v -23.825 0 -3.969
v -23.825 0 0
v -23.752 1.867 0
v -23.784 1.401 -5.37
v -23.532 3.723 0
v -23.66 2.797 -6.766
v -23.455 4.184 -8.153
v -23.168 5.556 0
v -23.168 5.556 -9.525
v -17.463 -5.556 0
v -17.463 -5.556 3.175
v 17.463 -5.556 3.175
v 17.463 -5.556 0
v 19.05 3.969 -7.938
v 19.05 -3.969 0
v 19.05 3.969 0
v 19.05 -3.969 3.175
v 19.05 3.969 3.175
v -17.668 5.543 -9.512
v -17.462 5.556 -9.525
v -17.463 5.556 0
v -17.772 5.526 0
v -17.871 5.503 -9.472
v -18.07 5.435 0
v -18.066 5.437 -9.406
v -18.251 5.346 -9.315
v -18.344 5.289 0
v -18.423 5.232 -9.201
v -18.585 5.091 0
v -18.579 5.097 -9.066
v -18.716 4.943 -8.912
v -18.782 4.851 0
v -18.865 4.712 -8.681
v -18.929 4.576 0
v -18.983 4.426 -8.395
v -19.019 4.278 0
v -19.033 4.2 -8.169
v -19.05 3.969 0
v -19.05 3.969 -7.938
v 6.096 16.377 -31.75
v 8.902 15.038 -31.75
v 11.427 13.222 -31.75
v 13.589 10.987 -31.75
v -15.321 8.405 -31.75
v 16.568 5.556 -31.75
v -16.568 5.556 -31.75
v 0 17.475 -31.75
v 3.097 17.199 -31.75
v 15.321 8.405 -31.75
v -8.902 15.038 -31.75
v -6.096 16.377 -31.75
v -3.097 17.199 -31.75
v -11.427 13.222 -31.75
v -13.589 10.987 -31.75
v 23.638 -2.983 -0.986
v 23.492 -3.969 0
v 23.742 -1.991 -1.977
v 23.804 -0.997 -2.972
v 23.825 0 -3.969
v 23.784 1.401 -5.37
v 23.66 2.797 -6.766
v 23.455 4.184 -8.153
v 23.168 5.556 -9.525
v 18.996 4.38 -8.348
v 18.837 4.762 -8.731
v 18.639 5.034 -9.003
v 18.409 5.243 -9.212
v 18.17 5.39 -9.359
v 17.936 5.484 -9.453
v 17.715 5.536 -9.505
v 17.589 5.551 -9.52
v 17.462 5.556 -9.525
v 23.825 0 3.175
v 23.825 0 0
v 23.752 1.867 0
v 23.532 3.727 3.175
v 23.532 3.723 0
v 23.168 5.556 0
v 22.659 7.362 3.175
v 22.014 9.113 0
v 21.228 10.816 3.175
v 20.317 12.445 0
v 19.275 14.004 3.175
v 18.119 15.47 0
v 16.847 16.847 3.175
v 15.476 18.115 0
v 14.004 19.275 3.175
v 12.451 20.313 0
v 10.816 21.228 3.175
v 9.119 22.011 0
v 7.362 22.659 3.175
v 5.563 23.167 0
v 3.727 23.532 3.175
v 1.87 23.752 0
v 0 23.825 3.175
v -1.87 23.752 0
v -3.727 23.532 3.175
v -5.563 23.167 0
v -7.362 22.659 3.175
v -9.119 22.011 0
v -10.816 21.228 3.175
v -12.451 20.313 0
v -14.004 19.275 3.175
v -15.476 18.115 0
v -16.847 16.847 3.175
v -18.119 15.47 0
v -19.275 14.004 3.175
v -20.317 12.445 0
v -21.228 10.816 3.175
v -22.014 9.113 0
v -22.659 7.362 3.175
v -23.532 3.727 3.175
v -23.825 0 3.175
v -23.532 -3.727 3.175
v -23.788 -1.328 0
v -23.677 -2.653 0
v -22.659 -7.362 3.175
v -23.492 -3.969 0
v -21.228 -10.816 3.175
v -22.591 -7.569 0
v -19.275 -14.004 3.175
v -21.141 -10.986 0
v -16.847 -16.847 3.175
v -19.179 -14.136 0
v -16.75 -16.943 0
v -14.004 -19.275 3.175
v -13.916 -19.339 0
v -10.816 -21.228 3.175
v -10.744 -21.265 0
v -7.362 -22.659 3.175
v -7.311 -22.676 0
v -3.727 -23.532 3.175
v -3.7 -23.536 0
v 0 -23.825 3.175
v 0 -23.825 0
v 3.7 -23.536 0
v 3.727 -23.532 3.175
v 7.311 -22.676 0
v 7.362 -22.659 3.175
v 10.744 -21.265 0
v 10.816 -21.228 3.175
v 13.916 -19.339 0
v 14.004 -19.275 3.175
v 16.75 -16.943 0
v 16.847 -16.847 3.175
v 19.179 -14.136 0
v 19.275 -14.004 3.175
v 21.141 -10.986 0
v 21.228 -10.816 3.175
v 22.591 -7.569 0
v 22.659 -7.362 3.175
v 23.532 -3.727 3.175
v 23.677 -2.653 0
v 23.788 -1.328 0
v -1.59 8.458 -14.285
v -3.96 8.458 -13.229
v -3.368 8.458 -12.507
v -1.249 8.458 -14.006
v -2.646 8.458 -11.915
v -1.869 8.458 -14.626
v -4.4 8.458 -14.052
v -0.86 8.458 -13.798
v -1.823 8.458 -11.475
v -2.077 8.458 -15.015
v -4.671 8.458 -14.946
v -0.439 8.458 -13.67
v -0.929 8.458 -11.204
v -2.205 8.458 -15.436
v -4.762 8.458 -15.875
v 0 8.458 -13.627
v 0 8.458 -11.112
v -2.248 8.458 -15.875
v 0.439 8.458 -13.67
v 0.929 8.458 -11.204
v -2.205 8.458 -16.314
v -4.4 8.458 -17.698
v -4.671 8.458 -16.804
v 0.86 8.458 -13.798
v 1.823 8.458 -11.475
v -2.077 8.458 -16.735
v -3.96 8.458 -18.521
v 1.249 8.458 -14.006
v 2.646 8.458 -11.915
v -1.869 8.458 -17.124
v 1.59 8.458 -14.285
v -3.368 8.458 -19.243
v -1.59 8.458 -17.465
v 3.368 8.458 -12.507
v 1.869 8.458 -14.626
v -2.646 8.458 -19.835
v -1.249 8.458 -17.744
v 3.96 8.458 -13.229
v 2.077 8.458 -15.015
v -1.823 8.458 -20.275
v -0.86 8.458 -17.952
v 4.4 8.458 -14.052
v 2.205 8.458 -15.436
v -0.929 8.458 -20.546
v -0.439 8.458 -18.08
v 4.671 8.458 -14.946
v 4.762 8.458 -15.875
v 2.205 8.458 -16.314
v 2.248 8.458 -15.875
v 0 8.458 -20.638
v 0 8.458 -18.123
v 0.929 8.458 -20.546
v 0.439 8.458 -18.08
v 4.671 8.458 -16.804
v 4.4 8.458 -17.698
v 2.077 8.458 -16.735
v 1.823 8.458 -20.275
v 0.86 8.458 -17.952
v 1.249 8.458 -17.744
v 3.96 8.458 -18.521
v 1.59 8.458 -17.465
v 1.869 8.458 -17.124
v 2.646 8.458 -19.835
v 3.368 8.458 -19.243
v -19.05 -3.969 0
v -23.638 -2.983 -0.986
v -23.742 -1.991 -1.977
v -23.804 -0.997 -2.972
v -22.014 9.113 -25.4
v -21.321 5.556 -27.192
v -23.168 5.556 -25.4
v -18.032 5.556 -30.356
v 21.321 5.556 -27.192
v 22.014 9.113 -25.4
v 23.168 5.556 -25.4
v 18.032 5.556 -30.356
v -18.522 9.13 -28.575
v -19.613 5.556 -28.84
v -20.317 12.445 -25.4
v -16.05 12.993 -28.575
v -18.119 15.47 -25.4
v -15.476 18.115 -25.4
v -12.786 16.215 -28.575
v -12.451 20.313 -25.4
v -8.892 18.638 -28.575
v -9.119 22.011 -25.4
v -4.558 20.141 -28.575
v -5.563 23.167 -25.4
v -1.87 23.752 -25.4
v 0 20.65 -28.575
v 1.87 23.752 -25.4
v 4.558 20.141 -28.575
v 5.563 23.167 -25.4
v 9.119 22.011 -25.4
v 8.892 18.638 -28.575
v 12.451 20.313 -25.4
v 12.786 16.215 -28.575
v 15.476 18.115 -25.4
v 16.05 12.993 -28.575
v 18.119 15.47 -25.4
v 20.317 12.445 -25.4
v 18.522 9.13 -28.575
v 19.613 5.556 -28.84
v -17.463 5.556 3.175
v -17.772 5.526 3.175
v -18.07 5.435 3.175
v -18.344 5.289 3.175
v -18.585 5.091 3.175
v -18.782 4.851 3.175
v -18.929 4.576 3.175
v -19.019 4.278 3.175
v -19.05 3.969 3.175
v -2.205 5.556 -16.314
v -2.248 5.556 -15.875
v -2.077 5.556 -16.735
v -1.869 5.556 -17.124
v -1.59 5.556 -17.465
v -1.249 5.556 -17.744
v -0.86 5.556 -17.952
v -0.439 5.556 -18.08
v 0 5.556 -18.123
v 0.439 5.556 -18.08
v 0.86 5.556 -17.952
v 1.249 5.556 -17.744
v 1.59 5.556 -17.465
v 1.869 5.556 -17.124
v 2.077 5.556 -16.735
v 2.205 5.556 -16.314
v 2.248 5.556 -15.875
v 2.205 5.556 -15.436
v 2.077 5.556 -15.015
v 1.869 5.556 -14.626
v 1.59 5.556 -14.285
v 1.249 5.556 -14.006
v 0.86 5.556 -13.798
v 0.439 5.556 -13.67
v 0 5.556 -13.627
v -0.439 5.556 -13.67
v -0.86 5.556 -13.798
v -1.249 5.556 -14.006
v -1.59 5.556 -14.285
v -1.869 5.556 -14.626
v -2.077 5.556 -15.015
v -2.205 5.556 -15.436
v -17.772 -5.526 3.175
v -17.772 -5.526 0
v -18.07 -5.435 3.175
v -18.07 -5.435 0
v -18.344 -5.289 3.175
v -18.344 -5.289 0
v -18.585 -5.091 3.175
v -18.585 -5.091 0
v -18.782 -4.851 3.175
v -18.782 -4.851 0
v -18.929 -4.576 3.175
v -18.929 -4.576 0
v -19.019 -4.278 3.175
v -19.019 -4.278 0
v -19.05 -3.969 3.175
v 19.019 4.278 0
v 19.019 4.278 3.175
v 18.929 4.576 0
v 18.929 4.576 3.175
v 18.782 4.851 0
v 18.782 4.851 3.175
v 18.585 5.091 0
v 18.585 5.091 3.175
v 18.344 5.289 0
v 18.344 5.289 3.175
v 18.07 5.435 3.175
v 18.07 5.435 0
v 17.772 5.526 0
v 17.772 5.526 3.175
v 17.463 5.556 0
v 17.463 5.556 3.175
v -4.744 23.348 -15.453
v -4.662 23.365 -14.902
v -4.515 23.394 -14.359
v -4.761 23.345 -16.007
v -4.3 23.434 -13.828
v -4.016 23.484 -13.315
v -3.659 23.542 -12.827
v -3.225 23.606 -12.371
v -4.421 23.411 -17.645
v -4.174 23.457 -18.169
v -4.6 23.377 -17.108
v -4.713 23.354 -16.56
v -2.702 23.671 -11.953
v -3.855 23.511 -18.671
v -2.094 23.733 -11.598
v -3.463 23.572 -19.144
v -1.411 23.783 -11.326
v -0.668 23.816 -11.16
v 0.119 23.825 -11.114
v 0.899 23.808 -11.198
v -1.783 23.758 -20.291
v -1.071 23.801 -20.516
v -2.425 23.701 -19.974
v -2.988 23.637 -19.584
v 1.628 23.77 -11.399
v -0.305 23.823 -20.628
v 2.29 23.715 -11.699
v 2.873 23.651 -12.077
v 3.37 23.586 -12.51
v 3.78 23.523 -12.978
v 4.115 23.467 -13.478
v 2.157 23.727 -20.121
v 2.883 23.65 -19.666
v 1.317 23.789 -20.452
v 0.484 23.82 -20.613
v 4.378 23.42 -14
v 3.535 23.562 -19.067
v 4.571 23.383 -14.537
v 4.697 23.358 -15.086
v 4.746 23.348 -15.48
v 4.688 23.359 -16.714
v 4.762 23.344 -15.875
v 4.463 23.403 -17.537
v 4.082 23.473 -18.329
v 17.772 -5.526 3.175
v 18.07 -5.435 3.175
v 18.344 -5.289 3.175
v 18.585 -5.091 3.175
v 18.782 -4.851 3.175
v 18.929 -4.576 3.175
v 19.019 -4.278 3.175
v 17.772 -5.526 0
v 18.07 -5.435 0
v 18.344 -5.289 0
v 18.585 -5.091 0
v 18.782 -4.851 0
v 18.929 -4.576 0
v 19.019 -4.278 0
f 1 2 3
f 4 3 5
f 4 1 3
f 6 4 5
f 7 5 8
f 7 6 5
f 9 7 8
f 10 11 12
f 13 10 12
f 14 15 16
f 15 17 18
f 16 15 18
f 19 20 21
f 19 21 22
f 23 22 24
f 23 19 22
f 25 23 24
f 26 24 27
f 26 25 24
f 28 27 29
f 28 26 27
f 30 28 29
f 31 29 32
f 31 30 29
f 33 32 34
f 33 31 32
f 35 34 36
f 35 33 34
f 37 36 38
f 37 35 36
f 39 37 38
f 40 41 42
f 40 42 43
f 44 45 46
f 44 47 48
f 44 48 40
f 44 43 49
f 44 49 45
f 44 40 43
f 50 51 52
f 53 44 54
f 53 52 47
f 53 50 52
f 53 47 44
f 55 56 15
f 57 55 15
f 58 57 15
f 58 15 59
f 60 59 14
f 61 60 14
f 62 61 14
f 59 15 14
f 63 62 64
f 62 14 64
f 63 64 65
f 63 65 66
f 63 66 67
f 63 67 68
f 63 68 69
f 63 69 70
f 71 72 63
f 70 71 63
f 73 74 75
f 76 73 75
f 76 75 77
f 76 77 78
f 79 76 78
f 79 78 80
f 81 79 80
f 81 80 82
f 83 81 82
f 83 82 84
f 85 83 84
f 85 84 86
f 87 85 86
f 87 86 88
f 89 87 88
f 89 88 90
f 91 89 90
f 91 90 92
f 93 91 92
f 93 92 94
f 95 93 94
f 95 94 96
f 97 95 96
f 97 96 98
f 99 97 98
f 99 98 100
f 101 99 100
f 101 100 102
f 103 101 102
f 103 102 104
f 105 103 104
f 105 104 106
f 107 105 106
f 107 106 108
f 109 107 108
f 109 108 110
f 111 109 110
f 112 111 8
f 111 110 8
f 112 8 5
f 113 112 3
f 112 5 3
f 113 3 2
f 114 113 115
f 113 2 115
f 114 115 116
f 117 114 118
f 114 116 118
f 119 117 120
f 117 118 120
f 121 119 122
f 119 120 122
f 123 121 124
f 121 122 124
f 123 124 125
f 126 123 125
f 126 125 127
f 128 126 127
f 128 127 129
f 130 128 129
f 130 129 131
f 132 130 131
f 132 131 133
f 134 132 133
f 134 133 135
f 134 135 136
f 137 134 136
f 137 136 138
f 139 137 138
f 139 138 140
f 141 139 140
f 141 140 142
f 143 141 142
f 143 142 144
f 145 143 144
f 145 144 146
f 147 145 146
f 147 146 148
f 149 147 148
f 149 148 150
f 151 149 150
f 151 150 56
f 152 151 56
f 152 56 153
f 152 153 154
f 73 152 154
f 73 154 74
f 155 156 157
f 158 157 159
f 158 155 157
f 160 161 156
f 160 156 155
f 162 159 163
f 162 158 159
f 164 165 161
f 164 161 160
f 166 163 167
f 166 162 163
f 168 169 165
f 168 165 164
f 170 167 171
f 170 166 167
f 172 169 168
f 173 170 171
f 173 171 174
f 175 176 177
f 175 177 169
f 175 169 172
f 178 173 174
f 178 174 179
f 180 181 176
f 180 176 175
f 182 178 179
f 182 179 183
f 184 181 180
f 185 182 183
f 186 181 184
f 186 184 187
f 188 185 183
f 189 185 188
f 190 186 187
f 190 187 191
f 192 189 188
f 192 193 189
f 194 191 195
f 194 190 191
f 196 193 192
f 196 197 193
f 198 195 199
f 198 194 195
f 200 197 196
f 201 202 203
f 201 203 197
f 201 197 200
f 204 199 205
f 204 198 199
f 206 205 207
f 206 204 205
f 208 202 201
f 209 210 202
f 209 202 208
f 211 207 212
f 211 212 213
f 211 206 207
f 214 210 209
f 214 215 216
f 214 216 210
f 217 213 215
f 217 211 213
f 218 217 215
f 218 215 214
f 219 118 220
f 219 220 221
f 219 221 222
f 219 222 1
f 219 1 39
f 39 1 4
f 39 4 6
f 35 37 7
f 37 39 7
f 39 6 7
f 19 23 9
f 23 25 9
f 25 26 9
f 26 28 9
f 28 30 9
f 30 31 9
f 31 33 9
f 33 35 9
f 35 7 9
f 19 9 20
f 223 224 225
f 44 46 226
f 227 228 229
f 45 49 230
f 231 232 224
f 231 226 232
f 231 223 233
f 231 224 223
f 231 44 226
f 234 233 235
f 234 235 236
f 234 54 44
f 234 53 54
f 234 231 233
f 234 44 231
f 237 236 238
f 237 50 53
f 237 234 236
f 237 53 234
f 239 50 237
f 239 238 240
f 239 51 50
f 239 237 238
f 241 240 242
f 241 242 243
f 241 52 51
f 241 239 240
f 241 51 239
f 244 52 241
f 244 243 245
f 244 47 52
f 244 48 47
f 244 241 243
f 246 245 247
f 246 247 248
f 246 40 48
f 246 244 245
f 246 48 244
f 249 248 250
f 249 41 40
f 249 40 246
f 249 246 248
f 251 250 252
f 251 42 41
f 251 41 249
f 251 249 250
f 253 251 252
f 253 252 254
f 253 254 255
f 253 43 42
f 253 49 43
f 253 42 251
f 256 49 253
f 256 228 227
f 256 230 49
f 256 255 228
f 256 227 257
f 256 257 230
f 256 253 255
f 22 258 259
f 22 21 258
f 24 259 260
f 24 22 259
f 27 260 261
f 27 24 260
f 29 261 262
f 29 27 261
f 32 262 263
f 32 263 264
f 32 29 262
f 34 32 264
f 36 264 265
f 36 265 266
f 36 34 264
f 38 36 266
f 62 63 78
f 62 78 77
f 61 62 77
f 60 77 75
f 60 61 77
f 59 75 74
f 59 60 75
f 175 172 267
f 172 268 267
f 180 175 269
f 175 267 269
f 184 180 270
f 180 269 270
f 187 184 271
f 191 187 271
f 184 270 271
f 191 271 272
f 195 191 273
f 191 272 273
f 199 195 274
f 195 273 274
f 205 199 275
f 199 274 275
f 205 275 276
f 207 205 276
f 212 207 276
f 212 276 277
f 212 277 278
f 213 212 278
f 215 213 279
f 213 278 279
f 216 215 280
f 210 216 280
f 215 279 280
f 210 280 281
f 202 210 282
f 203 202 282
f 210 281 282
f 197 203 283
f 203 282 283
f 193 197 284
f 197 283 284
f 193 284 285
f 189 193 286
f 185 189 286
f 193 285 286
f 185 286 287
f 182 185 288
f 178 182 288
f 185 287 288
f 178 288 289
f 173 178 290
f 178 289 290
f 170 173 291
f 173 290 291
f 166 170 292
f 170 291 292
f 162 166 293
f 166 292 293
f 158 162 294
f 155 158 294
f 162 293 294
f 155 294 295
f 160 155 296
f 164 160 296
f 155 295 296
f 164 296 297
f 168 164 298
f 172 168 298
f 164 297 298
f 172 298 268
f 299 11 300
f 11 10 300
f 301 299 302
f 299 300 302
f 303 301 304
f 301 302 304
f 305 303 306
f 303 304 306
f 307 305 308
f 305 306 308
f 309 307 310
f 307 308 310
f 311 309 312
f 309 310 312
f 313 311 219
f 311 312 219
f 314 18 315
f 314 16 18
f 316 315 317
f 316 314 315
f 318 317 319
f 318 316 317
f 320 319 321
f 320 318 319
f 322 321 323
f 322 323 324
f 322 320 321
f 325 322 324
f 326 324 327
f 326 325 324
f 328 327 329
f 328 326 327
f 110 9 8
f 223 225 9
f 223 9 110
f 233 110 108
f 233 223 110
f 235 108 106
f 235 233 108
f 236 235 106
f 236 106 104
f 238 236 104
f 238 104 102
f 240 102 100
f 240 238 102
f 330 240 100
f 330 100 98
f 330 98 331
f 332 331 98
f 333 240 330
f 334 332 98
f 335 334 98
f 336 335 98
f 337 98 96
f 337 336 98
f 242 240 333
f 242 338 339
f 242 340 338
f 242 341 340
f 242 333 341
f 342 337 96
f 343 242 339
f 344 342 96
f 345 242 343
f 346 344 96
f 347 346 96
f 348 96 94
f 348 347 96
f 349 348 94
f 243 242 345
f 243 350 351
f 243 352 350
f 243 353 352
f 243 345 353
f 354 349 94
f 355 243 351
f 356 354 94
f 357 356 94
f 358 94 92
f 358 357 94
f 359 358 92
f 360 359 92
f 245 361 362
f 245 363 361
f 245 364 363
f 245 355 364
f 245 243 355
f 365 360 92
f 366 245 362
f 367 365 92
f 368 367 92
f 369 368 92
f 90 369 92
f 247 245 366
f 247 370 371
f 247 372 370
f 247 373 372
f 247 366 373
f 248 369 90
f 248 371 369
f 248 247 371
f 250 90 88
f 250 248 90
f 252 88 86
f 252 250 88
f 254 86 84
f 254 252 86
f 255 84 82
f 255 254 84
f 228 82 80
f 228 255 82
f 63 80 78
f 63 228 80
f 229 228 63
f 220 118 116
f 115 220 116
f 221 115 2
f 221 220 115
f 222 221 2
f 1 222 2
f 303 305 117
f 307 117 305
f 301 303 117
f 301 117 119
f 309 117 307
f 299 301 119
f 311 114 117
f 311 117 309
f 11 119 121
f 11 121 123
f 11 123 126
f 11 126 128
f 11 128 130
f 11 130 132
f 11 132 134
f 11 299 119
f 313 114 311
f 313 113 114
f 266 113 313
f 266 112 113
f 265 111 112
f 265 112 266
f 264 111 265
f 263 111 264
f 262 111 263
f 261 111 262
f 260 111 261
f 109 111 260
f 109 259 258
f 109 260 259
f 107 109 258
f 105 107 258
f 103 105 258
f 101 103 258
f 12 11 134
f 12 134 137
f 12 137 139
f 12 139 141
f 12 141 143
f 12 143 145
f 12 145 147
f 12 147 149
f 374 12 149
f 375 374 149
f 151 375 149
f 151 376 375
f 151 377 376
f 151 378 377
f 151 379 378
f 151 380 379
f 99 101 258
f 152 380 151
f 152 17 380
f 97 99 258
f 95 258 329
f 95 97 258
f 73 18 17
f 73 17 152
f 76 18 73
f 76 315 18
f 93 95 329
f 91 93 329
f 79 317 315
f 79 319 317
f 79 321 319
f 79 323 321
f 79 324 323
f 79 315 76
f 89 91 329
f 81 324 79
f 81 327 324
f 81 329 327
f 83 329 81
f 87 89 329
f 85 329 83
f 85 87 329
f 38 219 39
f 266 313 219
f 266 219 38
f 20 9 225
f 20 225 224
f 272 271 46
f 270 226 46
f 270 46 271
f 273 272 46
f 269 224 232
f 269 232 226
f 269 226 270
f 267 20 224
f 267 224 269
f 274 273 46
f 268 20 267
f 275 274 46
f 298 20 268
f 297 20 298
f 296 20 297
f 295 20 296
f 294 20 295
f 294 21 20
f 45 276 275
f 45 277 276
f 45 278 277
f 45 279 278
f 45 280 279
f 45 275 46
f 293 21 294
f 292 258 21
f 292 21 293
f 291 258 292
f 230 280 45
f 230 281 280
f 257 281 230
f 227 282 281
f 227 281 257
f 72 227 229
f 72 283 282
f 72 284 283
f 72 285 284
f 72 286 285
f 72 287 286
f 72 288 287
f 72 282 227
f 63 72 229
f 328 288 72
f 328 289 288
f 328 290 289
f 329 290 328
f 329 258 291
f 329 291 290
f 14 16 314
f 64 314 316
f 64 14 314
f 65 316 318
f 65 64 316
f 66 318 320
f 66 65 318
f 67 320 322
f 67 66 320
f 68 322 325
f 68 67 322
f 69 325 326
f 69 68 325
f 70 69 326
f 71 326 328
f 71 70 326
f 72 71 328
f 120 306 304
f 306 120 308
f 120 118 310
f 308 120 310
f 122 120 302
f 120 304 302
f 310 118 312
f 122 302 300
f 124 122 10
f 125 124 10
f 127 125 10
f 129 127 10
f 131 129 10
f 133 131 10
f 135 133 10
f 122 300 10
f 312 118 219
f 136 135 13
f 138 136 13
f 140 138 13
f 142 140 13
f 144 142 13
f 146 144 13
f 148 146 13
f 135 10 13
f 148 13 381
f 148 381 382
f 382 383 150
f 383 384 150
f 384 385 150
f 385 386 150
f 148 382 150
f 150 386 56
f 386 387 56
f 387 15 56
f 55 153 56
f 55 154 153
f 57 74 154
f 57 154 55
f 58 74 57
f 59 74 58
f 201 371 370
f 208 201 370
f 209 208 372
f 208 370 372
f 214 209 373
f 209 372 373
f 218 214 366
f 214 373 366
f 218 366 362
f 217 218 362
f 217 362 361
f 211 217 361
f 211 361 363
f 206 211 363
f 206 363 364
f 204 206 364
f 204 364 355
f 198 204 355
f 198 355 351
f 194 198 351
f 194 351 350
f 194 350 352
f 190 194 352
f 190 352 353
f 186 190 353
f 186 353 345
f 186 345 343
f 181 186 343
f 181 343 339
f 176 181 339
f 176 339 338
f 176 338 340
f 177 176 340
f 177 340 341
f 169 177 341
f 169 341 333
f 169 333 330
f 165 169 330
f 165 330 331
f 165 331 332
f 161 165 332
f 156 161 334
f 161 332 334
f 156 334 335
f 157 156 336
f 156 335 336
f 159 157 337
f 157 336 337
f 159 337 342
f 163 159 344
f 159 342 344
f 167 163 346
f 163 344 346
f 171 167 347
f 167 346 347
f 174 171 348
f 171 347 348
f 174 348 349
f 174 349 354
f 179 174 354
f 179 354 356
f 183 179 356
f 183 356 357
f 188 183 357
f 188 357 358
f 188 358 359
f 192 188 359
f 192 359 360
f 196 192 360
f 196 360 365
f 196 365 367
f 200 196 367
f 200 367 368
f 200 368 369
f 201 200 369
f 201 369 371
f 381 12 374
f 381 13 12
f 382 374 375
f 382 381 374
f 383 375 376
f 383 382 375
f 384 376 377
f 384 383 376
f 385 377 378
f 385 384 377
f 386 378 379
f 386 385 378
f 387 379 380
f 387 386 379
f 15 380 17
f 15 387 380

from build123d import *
from build123d.topology import SkipClean

# Parameters (mm, degrees)
SKETCH1_R                                           = 23.8252
BOSS_EXTRUDE1_DEPTH                                 = 3.175
SKETCH8_W                                           = 38.1
SKETCH8_H                                           = 11.1125
CUT_EXTRUDE1_DEPTH                                  = 34.843181515
FILLET1_R                                           = 1.5875
BOSS_EXTRUDE2_START                                 = 31.75
BOSS_EXTRUDE2_DEPTH                                 = 31.75
CHAMFER1_START                                      = -23.8252001
CHAMFER1_DEPTH                                      = 6.3627001
CHAMFER1_START_2                                    = 17.4625
CHAMFER1_2_DEPTH                                    = 6.3627
CHAMFER1_START_3                                    = -31.7500001
CHAMFER1_3_DEPTH                                    = 31.7500001
CBORE_FOR_8_BINDING_HEAD_MACHINE_SCREW1_D           = 4.4958
CBORE_FOR_8_BINDING_HEAD_MACHINE_SCREW1_CBORE_D     = 9.525
CBORE_FOR_8_BINDING_HEAD_MACHINE_SCREW1_CBORE_DEPTH = 15.367
CHAMFER3_SIZE                                       = 6.35


with BuildPart() as part:
    # Sketch1 → Boss-Extrude1 (new body)
    with BuildSketch(Plane.XY):
        Circle(SKETCH1_R)
    extrude(amount=BOSS_EXTRUDE1_DEPTH)

    # Sketch8 → Cut-Extrude1 (cut, through all)
    with BuildSketch(Plane.XY.offset(3.175)):
        Rectangle(SKETCH8_W, SKETCH8_H)
    extrude(amount=-CUT_EXTRUDE1_DEPTH, mode=Mode.SUBTRACT)

    # Fillet1
    fillet1_edges = [part.edges().sort_by_distance(p)[0] for p in [
        (19.05, -5.55625, 1.5875),
        (-19.05, -5.55625, 1.5875),
        (-19.05, 5.55625, 1.5875),
        (19.05, 5.55625, 1.5875),
    ]]
    fillet(fillet1_edges, radius=FILLET1_R)

    # Sketch9 → Boss-Extrude2 (add)
    with SkipClean():  # the faces are left unmerged after this step: merging them gives an invalid solid
        with BuildSketch(Plane(origin=(0, 0, 0), x_dir=(-1, 0, 0), z_dir=(0, 0, -1)).offset(BOSS_EXTRUDE2_START)):
            with BuildLine():
                Line((-23.168259343, 5.55625), (23.168259343, 5.55625))
                ThreePointArc((23.168259343, 5.55625), (0, 23.8252), (-23.168259343, 5.55625))
            make_face()
        extrude(amount=-BOSS_EXTRUDE2_DEPTH)

    # Chamfer1: read off the stored shape, not the designer's step
    # Chamfer1 outline → Chamfer1 (add)
    with SkipClean():  # the faces are left unmerged after this step: merging them gives an invalid solid
        with BuildSketch(Plane.YZ.offset(CHAMFER1_START)):
            Polygon((5.55625, 0), (-3.96875, 0), (5.55625, -9.525), align=None)
        extrude(amount=CHAMFER1_DEPTH)

    # Chamfer1 2 outline → Chamfer1 2 (add)
    with SkipClean():  # the faces are left unmerged after this step: merging them gives an invalid solid
        with BuildSketch(Plane.YZ.offset(CHAMFER1_START_2)):
            Polygon((5.55625, 0), (-3.96875, 0), (5.55625, -9.525), align=None)
        extrude(amount=CHAMFER1_2_DEPTH)

    # Chamfer1 3 outline → Chamfer1 3 (cut)
    with BuildSketch(Plane.XY.offset(CHAMFER1_START_3)):
        with BuildLine():
            Line((23.8252, -5), (23.8252, 0))
            ThreePointArc((23.8252, 0), (23.692188185, -2.514035408), (23.294637903, -5))
            Line((23.294637903, -5), (23.8252, -5))
        make_face()
        with BuildLine():
            ThreePointArc((23.168259343, 5.55625), (23.660394835, 2.797475875), (23.8252, 0))
            Line((23.8252, 0), (23.8252, 5.55625))
            Line((23.8252, 5.55625), (23.168259343, 5.55625))
        make_face()
        with BuildLine():
            ThreePointArc((19.05, 3.96875), (18.585032015, 5.091282015), (17.4625, 5.55625))
            Line((17.4625, 5.55625), (17.4625, -5))
            Line((17.4625, -5), (19.05, -5))
            Line((19.05, -5), (19.05, 3.96875))
        make_face()
        with BuildLine():
            Line((-23.8252001, -5), (-23.294637903, -5))
            ThreePointArc((-23.294637903, -5), (-23.692188185, -2.514035408), (-23.8252, 0))
            Line((-23.8252, 0), (-23.8252001, -5))
        make_face()
        with BuildLine():
            Line((-17.4625, -5), (-17.4625, 5.55625))
            ThreePointArc((-17.4625, 5.55625), (-18.585032015, 5.091282015), (-19.05, 3.96875))
            Line((-19.05, 3.96875), (-19.05, -5))
            Line((-19.05, -5), (-17.4625, -5))
        make_face()
        with BuildLine():
            Line((-23.8252001, 5.55625), (-23.8252, 0))
            ThreePointArc((-23.8252, 0), (-23.660394835, 2.797475875), (-23.168259343, 5.55625))
            Line((-23.168259343, 5.55625), (-23.8252001, 5.55625))
        make_face()
    extrude(amount=CHAMFER1_3_DEPTH, mode=Mode.SUBTRACT)

    # CBORE for #8 Binding Head Machine Screw1 (through all)
    with Locations(Plane(origin=(0, 23.8252, 0), x_dir=(1, 0, 0), z_dir=(0, 1, 0))):
        with Locations((0, 15.875)):
            CounterBoreHole(CBORE_FOR_8_BINDING_HEAD_MACHINE_SCREW1_D / 2, CBORE_FOR_8_BINDING_HEAD_MACHINE_SCREW1_CBORE_D / 2, CBORE_FOR_8_BINDING_HEAD_MACHINE_SCREW1_CBORE_DEPTH)

    # Chamfer3
    chamfer3_edges = [part.edges().sort_by_distance(p)[0] for p in [
        (0, 23.8252, -31.75),
    ]]
    chamfer(chamfer3_edges, length=CHAMFER3_SIZE)


solid = part.part
